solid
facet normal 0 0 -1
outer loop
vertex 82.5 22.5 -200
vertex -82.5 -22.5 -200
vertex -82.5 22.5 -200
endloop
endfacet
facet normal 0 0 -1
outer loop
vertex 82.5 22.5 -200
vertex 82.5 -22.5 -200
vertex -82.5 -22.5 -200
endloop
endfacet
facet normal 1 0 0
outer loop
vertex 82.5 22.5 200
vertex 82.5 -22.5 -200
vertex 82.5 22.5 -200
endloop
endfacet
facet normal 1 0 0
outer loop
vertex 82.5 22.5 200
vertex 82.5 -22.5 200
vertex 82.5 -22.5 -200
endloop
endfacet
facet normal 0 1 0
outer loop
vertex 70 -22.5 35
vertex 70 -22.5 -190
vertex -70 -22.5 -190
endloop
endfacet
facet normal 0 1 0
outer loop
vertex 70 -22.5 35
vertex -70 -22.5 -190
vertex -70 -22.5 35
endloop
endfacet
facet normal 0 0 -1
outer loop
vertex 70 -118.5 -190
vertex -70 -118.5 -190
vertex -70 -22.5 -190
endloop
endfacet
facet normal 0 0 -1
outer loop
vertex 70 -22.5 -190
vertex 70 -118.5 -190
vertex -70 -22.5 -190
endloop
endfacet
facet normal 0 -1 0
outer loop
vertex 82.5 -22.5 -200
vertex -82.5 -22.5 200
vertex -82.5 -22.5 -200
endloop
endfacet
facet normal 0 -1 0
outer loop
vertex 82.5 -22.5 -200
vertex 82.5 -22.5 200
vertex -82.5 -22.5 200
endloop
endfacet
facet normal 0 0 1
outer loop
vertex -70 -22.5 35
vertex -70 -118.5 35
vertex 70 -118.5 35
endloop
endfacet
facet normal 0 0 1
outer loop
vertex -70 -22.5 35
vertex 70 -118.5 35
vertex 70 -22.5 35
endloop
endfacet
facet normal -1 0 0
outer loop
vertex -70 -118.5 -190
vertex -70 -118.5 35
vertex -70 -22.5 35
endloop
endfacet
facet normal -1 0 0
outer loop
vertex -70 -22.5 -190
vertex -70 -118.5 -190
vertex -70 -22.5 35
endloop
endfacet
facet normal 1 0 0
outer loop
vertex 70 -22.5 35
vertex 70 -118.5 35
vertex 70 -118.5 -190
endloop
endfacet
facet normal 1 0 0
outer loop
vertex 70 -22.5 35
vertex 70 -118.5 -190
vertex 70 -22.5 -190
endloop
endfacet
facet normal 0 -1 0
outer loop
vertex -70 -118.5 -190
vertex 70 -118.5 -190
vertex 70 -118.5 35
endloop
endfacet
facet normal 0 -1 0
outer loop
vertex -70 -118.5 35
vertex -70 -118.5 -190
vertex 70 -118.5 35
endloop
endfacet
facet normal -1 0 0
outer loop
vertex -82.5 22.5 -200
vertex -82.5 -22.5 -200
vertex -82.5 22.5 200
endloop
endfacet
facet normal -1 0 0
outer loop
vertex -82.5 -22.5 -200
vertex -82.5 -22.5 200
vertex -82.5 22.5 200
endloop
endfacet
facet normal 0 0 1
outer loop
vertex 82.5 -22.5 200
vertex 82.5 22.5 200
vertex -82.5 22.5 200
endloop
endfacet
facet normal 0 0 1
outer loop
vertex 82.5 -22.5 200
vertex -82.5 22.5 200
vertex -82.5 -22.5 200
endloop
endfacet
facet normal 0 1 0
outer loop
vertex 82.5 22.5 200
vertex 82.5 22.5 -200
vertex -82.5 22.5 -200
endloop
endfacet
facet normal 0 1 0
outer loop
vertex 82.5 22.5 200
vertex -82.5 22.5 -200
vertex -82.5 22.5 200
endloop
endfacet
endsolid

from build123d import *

# Parameters (mm, degrees)
F0_W     = 96
F0_H     = 225
F1_DEPTH = 70
F2_DEPTH = 82.5


# Not quite as in the source:
# - a feature names something its author has since deleted; it is built from what else it names


with BuildPart() as f1:
    # F0 (on Right) → F1 (new body, symmetric)
    with BuildSketch(Plane.YZ):
        with Locations((-70.5, -77.5)):
            Rectangle(F0_W, F0_H)
    extrude(amount=F1_DEPTH, both=True)


with BuildPart() as f2:
    # F0 (on Right) → F2 (new body, symmetric)
    with BuildSketch(Plane.YZ):
        Polygon((-22.5, -190), (-22.5, -200), (22.5, -200), (22.5, 200), (-22.5, 200), (-22.5, 35), align=None)
    extrude(amount=F2_DEPTH, both=True)


solid = Compound([f1.part, f2.part])
